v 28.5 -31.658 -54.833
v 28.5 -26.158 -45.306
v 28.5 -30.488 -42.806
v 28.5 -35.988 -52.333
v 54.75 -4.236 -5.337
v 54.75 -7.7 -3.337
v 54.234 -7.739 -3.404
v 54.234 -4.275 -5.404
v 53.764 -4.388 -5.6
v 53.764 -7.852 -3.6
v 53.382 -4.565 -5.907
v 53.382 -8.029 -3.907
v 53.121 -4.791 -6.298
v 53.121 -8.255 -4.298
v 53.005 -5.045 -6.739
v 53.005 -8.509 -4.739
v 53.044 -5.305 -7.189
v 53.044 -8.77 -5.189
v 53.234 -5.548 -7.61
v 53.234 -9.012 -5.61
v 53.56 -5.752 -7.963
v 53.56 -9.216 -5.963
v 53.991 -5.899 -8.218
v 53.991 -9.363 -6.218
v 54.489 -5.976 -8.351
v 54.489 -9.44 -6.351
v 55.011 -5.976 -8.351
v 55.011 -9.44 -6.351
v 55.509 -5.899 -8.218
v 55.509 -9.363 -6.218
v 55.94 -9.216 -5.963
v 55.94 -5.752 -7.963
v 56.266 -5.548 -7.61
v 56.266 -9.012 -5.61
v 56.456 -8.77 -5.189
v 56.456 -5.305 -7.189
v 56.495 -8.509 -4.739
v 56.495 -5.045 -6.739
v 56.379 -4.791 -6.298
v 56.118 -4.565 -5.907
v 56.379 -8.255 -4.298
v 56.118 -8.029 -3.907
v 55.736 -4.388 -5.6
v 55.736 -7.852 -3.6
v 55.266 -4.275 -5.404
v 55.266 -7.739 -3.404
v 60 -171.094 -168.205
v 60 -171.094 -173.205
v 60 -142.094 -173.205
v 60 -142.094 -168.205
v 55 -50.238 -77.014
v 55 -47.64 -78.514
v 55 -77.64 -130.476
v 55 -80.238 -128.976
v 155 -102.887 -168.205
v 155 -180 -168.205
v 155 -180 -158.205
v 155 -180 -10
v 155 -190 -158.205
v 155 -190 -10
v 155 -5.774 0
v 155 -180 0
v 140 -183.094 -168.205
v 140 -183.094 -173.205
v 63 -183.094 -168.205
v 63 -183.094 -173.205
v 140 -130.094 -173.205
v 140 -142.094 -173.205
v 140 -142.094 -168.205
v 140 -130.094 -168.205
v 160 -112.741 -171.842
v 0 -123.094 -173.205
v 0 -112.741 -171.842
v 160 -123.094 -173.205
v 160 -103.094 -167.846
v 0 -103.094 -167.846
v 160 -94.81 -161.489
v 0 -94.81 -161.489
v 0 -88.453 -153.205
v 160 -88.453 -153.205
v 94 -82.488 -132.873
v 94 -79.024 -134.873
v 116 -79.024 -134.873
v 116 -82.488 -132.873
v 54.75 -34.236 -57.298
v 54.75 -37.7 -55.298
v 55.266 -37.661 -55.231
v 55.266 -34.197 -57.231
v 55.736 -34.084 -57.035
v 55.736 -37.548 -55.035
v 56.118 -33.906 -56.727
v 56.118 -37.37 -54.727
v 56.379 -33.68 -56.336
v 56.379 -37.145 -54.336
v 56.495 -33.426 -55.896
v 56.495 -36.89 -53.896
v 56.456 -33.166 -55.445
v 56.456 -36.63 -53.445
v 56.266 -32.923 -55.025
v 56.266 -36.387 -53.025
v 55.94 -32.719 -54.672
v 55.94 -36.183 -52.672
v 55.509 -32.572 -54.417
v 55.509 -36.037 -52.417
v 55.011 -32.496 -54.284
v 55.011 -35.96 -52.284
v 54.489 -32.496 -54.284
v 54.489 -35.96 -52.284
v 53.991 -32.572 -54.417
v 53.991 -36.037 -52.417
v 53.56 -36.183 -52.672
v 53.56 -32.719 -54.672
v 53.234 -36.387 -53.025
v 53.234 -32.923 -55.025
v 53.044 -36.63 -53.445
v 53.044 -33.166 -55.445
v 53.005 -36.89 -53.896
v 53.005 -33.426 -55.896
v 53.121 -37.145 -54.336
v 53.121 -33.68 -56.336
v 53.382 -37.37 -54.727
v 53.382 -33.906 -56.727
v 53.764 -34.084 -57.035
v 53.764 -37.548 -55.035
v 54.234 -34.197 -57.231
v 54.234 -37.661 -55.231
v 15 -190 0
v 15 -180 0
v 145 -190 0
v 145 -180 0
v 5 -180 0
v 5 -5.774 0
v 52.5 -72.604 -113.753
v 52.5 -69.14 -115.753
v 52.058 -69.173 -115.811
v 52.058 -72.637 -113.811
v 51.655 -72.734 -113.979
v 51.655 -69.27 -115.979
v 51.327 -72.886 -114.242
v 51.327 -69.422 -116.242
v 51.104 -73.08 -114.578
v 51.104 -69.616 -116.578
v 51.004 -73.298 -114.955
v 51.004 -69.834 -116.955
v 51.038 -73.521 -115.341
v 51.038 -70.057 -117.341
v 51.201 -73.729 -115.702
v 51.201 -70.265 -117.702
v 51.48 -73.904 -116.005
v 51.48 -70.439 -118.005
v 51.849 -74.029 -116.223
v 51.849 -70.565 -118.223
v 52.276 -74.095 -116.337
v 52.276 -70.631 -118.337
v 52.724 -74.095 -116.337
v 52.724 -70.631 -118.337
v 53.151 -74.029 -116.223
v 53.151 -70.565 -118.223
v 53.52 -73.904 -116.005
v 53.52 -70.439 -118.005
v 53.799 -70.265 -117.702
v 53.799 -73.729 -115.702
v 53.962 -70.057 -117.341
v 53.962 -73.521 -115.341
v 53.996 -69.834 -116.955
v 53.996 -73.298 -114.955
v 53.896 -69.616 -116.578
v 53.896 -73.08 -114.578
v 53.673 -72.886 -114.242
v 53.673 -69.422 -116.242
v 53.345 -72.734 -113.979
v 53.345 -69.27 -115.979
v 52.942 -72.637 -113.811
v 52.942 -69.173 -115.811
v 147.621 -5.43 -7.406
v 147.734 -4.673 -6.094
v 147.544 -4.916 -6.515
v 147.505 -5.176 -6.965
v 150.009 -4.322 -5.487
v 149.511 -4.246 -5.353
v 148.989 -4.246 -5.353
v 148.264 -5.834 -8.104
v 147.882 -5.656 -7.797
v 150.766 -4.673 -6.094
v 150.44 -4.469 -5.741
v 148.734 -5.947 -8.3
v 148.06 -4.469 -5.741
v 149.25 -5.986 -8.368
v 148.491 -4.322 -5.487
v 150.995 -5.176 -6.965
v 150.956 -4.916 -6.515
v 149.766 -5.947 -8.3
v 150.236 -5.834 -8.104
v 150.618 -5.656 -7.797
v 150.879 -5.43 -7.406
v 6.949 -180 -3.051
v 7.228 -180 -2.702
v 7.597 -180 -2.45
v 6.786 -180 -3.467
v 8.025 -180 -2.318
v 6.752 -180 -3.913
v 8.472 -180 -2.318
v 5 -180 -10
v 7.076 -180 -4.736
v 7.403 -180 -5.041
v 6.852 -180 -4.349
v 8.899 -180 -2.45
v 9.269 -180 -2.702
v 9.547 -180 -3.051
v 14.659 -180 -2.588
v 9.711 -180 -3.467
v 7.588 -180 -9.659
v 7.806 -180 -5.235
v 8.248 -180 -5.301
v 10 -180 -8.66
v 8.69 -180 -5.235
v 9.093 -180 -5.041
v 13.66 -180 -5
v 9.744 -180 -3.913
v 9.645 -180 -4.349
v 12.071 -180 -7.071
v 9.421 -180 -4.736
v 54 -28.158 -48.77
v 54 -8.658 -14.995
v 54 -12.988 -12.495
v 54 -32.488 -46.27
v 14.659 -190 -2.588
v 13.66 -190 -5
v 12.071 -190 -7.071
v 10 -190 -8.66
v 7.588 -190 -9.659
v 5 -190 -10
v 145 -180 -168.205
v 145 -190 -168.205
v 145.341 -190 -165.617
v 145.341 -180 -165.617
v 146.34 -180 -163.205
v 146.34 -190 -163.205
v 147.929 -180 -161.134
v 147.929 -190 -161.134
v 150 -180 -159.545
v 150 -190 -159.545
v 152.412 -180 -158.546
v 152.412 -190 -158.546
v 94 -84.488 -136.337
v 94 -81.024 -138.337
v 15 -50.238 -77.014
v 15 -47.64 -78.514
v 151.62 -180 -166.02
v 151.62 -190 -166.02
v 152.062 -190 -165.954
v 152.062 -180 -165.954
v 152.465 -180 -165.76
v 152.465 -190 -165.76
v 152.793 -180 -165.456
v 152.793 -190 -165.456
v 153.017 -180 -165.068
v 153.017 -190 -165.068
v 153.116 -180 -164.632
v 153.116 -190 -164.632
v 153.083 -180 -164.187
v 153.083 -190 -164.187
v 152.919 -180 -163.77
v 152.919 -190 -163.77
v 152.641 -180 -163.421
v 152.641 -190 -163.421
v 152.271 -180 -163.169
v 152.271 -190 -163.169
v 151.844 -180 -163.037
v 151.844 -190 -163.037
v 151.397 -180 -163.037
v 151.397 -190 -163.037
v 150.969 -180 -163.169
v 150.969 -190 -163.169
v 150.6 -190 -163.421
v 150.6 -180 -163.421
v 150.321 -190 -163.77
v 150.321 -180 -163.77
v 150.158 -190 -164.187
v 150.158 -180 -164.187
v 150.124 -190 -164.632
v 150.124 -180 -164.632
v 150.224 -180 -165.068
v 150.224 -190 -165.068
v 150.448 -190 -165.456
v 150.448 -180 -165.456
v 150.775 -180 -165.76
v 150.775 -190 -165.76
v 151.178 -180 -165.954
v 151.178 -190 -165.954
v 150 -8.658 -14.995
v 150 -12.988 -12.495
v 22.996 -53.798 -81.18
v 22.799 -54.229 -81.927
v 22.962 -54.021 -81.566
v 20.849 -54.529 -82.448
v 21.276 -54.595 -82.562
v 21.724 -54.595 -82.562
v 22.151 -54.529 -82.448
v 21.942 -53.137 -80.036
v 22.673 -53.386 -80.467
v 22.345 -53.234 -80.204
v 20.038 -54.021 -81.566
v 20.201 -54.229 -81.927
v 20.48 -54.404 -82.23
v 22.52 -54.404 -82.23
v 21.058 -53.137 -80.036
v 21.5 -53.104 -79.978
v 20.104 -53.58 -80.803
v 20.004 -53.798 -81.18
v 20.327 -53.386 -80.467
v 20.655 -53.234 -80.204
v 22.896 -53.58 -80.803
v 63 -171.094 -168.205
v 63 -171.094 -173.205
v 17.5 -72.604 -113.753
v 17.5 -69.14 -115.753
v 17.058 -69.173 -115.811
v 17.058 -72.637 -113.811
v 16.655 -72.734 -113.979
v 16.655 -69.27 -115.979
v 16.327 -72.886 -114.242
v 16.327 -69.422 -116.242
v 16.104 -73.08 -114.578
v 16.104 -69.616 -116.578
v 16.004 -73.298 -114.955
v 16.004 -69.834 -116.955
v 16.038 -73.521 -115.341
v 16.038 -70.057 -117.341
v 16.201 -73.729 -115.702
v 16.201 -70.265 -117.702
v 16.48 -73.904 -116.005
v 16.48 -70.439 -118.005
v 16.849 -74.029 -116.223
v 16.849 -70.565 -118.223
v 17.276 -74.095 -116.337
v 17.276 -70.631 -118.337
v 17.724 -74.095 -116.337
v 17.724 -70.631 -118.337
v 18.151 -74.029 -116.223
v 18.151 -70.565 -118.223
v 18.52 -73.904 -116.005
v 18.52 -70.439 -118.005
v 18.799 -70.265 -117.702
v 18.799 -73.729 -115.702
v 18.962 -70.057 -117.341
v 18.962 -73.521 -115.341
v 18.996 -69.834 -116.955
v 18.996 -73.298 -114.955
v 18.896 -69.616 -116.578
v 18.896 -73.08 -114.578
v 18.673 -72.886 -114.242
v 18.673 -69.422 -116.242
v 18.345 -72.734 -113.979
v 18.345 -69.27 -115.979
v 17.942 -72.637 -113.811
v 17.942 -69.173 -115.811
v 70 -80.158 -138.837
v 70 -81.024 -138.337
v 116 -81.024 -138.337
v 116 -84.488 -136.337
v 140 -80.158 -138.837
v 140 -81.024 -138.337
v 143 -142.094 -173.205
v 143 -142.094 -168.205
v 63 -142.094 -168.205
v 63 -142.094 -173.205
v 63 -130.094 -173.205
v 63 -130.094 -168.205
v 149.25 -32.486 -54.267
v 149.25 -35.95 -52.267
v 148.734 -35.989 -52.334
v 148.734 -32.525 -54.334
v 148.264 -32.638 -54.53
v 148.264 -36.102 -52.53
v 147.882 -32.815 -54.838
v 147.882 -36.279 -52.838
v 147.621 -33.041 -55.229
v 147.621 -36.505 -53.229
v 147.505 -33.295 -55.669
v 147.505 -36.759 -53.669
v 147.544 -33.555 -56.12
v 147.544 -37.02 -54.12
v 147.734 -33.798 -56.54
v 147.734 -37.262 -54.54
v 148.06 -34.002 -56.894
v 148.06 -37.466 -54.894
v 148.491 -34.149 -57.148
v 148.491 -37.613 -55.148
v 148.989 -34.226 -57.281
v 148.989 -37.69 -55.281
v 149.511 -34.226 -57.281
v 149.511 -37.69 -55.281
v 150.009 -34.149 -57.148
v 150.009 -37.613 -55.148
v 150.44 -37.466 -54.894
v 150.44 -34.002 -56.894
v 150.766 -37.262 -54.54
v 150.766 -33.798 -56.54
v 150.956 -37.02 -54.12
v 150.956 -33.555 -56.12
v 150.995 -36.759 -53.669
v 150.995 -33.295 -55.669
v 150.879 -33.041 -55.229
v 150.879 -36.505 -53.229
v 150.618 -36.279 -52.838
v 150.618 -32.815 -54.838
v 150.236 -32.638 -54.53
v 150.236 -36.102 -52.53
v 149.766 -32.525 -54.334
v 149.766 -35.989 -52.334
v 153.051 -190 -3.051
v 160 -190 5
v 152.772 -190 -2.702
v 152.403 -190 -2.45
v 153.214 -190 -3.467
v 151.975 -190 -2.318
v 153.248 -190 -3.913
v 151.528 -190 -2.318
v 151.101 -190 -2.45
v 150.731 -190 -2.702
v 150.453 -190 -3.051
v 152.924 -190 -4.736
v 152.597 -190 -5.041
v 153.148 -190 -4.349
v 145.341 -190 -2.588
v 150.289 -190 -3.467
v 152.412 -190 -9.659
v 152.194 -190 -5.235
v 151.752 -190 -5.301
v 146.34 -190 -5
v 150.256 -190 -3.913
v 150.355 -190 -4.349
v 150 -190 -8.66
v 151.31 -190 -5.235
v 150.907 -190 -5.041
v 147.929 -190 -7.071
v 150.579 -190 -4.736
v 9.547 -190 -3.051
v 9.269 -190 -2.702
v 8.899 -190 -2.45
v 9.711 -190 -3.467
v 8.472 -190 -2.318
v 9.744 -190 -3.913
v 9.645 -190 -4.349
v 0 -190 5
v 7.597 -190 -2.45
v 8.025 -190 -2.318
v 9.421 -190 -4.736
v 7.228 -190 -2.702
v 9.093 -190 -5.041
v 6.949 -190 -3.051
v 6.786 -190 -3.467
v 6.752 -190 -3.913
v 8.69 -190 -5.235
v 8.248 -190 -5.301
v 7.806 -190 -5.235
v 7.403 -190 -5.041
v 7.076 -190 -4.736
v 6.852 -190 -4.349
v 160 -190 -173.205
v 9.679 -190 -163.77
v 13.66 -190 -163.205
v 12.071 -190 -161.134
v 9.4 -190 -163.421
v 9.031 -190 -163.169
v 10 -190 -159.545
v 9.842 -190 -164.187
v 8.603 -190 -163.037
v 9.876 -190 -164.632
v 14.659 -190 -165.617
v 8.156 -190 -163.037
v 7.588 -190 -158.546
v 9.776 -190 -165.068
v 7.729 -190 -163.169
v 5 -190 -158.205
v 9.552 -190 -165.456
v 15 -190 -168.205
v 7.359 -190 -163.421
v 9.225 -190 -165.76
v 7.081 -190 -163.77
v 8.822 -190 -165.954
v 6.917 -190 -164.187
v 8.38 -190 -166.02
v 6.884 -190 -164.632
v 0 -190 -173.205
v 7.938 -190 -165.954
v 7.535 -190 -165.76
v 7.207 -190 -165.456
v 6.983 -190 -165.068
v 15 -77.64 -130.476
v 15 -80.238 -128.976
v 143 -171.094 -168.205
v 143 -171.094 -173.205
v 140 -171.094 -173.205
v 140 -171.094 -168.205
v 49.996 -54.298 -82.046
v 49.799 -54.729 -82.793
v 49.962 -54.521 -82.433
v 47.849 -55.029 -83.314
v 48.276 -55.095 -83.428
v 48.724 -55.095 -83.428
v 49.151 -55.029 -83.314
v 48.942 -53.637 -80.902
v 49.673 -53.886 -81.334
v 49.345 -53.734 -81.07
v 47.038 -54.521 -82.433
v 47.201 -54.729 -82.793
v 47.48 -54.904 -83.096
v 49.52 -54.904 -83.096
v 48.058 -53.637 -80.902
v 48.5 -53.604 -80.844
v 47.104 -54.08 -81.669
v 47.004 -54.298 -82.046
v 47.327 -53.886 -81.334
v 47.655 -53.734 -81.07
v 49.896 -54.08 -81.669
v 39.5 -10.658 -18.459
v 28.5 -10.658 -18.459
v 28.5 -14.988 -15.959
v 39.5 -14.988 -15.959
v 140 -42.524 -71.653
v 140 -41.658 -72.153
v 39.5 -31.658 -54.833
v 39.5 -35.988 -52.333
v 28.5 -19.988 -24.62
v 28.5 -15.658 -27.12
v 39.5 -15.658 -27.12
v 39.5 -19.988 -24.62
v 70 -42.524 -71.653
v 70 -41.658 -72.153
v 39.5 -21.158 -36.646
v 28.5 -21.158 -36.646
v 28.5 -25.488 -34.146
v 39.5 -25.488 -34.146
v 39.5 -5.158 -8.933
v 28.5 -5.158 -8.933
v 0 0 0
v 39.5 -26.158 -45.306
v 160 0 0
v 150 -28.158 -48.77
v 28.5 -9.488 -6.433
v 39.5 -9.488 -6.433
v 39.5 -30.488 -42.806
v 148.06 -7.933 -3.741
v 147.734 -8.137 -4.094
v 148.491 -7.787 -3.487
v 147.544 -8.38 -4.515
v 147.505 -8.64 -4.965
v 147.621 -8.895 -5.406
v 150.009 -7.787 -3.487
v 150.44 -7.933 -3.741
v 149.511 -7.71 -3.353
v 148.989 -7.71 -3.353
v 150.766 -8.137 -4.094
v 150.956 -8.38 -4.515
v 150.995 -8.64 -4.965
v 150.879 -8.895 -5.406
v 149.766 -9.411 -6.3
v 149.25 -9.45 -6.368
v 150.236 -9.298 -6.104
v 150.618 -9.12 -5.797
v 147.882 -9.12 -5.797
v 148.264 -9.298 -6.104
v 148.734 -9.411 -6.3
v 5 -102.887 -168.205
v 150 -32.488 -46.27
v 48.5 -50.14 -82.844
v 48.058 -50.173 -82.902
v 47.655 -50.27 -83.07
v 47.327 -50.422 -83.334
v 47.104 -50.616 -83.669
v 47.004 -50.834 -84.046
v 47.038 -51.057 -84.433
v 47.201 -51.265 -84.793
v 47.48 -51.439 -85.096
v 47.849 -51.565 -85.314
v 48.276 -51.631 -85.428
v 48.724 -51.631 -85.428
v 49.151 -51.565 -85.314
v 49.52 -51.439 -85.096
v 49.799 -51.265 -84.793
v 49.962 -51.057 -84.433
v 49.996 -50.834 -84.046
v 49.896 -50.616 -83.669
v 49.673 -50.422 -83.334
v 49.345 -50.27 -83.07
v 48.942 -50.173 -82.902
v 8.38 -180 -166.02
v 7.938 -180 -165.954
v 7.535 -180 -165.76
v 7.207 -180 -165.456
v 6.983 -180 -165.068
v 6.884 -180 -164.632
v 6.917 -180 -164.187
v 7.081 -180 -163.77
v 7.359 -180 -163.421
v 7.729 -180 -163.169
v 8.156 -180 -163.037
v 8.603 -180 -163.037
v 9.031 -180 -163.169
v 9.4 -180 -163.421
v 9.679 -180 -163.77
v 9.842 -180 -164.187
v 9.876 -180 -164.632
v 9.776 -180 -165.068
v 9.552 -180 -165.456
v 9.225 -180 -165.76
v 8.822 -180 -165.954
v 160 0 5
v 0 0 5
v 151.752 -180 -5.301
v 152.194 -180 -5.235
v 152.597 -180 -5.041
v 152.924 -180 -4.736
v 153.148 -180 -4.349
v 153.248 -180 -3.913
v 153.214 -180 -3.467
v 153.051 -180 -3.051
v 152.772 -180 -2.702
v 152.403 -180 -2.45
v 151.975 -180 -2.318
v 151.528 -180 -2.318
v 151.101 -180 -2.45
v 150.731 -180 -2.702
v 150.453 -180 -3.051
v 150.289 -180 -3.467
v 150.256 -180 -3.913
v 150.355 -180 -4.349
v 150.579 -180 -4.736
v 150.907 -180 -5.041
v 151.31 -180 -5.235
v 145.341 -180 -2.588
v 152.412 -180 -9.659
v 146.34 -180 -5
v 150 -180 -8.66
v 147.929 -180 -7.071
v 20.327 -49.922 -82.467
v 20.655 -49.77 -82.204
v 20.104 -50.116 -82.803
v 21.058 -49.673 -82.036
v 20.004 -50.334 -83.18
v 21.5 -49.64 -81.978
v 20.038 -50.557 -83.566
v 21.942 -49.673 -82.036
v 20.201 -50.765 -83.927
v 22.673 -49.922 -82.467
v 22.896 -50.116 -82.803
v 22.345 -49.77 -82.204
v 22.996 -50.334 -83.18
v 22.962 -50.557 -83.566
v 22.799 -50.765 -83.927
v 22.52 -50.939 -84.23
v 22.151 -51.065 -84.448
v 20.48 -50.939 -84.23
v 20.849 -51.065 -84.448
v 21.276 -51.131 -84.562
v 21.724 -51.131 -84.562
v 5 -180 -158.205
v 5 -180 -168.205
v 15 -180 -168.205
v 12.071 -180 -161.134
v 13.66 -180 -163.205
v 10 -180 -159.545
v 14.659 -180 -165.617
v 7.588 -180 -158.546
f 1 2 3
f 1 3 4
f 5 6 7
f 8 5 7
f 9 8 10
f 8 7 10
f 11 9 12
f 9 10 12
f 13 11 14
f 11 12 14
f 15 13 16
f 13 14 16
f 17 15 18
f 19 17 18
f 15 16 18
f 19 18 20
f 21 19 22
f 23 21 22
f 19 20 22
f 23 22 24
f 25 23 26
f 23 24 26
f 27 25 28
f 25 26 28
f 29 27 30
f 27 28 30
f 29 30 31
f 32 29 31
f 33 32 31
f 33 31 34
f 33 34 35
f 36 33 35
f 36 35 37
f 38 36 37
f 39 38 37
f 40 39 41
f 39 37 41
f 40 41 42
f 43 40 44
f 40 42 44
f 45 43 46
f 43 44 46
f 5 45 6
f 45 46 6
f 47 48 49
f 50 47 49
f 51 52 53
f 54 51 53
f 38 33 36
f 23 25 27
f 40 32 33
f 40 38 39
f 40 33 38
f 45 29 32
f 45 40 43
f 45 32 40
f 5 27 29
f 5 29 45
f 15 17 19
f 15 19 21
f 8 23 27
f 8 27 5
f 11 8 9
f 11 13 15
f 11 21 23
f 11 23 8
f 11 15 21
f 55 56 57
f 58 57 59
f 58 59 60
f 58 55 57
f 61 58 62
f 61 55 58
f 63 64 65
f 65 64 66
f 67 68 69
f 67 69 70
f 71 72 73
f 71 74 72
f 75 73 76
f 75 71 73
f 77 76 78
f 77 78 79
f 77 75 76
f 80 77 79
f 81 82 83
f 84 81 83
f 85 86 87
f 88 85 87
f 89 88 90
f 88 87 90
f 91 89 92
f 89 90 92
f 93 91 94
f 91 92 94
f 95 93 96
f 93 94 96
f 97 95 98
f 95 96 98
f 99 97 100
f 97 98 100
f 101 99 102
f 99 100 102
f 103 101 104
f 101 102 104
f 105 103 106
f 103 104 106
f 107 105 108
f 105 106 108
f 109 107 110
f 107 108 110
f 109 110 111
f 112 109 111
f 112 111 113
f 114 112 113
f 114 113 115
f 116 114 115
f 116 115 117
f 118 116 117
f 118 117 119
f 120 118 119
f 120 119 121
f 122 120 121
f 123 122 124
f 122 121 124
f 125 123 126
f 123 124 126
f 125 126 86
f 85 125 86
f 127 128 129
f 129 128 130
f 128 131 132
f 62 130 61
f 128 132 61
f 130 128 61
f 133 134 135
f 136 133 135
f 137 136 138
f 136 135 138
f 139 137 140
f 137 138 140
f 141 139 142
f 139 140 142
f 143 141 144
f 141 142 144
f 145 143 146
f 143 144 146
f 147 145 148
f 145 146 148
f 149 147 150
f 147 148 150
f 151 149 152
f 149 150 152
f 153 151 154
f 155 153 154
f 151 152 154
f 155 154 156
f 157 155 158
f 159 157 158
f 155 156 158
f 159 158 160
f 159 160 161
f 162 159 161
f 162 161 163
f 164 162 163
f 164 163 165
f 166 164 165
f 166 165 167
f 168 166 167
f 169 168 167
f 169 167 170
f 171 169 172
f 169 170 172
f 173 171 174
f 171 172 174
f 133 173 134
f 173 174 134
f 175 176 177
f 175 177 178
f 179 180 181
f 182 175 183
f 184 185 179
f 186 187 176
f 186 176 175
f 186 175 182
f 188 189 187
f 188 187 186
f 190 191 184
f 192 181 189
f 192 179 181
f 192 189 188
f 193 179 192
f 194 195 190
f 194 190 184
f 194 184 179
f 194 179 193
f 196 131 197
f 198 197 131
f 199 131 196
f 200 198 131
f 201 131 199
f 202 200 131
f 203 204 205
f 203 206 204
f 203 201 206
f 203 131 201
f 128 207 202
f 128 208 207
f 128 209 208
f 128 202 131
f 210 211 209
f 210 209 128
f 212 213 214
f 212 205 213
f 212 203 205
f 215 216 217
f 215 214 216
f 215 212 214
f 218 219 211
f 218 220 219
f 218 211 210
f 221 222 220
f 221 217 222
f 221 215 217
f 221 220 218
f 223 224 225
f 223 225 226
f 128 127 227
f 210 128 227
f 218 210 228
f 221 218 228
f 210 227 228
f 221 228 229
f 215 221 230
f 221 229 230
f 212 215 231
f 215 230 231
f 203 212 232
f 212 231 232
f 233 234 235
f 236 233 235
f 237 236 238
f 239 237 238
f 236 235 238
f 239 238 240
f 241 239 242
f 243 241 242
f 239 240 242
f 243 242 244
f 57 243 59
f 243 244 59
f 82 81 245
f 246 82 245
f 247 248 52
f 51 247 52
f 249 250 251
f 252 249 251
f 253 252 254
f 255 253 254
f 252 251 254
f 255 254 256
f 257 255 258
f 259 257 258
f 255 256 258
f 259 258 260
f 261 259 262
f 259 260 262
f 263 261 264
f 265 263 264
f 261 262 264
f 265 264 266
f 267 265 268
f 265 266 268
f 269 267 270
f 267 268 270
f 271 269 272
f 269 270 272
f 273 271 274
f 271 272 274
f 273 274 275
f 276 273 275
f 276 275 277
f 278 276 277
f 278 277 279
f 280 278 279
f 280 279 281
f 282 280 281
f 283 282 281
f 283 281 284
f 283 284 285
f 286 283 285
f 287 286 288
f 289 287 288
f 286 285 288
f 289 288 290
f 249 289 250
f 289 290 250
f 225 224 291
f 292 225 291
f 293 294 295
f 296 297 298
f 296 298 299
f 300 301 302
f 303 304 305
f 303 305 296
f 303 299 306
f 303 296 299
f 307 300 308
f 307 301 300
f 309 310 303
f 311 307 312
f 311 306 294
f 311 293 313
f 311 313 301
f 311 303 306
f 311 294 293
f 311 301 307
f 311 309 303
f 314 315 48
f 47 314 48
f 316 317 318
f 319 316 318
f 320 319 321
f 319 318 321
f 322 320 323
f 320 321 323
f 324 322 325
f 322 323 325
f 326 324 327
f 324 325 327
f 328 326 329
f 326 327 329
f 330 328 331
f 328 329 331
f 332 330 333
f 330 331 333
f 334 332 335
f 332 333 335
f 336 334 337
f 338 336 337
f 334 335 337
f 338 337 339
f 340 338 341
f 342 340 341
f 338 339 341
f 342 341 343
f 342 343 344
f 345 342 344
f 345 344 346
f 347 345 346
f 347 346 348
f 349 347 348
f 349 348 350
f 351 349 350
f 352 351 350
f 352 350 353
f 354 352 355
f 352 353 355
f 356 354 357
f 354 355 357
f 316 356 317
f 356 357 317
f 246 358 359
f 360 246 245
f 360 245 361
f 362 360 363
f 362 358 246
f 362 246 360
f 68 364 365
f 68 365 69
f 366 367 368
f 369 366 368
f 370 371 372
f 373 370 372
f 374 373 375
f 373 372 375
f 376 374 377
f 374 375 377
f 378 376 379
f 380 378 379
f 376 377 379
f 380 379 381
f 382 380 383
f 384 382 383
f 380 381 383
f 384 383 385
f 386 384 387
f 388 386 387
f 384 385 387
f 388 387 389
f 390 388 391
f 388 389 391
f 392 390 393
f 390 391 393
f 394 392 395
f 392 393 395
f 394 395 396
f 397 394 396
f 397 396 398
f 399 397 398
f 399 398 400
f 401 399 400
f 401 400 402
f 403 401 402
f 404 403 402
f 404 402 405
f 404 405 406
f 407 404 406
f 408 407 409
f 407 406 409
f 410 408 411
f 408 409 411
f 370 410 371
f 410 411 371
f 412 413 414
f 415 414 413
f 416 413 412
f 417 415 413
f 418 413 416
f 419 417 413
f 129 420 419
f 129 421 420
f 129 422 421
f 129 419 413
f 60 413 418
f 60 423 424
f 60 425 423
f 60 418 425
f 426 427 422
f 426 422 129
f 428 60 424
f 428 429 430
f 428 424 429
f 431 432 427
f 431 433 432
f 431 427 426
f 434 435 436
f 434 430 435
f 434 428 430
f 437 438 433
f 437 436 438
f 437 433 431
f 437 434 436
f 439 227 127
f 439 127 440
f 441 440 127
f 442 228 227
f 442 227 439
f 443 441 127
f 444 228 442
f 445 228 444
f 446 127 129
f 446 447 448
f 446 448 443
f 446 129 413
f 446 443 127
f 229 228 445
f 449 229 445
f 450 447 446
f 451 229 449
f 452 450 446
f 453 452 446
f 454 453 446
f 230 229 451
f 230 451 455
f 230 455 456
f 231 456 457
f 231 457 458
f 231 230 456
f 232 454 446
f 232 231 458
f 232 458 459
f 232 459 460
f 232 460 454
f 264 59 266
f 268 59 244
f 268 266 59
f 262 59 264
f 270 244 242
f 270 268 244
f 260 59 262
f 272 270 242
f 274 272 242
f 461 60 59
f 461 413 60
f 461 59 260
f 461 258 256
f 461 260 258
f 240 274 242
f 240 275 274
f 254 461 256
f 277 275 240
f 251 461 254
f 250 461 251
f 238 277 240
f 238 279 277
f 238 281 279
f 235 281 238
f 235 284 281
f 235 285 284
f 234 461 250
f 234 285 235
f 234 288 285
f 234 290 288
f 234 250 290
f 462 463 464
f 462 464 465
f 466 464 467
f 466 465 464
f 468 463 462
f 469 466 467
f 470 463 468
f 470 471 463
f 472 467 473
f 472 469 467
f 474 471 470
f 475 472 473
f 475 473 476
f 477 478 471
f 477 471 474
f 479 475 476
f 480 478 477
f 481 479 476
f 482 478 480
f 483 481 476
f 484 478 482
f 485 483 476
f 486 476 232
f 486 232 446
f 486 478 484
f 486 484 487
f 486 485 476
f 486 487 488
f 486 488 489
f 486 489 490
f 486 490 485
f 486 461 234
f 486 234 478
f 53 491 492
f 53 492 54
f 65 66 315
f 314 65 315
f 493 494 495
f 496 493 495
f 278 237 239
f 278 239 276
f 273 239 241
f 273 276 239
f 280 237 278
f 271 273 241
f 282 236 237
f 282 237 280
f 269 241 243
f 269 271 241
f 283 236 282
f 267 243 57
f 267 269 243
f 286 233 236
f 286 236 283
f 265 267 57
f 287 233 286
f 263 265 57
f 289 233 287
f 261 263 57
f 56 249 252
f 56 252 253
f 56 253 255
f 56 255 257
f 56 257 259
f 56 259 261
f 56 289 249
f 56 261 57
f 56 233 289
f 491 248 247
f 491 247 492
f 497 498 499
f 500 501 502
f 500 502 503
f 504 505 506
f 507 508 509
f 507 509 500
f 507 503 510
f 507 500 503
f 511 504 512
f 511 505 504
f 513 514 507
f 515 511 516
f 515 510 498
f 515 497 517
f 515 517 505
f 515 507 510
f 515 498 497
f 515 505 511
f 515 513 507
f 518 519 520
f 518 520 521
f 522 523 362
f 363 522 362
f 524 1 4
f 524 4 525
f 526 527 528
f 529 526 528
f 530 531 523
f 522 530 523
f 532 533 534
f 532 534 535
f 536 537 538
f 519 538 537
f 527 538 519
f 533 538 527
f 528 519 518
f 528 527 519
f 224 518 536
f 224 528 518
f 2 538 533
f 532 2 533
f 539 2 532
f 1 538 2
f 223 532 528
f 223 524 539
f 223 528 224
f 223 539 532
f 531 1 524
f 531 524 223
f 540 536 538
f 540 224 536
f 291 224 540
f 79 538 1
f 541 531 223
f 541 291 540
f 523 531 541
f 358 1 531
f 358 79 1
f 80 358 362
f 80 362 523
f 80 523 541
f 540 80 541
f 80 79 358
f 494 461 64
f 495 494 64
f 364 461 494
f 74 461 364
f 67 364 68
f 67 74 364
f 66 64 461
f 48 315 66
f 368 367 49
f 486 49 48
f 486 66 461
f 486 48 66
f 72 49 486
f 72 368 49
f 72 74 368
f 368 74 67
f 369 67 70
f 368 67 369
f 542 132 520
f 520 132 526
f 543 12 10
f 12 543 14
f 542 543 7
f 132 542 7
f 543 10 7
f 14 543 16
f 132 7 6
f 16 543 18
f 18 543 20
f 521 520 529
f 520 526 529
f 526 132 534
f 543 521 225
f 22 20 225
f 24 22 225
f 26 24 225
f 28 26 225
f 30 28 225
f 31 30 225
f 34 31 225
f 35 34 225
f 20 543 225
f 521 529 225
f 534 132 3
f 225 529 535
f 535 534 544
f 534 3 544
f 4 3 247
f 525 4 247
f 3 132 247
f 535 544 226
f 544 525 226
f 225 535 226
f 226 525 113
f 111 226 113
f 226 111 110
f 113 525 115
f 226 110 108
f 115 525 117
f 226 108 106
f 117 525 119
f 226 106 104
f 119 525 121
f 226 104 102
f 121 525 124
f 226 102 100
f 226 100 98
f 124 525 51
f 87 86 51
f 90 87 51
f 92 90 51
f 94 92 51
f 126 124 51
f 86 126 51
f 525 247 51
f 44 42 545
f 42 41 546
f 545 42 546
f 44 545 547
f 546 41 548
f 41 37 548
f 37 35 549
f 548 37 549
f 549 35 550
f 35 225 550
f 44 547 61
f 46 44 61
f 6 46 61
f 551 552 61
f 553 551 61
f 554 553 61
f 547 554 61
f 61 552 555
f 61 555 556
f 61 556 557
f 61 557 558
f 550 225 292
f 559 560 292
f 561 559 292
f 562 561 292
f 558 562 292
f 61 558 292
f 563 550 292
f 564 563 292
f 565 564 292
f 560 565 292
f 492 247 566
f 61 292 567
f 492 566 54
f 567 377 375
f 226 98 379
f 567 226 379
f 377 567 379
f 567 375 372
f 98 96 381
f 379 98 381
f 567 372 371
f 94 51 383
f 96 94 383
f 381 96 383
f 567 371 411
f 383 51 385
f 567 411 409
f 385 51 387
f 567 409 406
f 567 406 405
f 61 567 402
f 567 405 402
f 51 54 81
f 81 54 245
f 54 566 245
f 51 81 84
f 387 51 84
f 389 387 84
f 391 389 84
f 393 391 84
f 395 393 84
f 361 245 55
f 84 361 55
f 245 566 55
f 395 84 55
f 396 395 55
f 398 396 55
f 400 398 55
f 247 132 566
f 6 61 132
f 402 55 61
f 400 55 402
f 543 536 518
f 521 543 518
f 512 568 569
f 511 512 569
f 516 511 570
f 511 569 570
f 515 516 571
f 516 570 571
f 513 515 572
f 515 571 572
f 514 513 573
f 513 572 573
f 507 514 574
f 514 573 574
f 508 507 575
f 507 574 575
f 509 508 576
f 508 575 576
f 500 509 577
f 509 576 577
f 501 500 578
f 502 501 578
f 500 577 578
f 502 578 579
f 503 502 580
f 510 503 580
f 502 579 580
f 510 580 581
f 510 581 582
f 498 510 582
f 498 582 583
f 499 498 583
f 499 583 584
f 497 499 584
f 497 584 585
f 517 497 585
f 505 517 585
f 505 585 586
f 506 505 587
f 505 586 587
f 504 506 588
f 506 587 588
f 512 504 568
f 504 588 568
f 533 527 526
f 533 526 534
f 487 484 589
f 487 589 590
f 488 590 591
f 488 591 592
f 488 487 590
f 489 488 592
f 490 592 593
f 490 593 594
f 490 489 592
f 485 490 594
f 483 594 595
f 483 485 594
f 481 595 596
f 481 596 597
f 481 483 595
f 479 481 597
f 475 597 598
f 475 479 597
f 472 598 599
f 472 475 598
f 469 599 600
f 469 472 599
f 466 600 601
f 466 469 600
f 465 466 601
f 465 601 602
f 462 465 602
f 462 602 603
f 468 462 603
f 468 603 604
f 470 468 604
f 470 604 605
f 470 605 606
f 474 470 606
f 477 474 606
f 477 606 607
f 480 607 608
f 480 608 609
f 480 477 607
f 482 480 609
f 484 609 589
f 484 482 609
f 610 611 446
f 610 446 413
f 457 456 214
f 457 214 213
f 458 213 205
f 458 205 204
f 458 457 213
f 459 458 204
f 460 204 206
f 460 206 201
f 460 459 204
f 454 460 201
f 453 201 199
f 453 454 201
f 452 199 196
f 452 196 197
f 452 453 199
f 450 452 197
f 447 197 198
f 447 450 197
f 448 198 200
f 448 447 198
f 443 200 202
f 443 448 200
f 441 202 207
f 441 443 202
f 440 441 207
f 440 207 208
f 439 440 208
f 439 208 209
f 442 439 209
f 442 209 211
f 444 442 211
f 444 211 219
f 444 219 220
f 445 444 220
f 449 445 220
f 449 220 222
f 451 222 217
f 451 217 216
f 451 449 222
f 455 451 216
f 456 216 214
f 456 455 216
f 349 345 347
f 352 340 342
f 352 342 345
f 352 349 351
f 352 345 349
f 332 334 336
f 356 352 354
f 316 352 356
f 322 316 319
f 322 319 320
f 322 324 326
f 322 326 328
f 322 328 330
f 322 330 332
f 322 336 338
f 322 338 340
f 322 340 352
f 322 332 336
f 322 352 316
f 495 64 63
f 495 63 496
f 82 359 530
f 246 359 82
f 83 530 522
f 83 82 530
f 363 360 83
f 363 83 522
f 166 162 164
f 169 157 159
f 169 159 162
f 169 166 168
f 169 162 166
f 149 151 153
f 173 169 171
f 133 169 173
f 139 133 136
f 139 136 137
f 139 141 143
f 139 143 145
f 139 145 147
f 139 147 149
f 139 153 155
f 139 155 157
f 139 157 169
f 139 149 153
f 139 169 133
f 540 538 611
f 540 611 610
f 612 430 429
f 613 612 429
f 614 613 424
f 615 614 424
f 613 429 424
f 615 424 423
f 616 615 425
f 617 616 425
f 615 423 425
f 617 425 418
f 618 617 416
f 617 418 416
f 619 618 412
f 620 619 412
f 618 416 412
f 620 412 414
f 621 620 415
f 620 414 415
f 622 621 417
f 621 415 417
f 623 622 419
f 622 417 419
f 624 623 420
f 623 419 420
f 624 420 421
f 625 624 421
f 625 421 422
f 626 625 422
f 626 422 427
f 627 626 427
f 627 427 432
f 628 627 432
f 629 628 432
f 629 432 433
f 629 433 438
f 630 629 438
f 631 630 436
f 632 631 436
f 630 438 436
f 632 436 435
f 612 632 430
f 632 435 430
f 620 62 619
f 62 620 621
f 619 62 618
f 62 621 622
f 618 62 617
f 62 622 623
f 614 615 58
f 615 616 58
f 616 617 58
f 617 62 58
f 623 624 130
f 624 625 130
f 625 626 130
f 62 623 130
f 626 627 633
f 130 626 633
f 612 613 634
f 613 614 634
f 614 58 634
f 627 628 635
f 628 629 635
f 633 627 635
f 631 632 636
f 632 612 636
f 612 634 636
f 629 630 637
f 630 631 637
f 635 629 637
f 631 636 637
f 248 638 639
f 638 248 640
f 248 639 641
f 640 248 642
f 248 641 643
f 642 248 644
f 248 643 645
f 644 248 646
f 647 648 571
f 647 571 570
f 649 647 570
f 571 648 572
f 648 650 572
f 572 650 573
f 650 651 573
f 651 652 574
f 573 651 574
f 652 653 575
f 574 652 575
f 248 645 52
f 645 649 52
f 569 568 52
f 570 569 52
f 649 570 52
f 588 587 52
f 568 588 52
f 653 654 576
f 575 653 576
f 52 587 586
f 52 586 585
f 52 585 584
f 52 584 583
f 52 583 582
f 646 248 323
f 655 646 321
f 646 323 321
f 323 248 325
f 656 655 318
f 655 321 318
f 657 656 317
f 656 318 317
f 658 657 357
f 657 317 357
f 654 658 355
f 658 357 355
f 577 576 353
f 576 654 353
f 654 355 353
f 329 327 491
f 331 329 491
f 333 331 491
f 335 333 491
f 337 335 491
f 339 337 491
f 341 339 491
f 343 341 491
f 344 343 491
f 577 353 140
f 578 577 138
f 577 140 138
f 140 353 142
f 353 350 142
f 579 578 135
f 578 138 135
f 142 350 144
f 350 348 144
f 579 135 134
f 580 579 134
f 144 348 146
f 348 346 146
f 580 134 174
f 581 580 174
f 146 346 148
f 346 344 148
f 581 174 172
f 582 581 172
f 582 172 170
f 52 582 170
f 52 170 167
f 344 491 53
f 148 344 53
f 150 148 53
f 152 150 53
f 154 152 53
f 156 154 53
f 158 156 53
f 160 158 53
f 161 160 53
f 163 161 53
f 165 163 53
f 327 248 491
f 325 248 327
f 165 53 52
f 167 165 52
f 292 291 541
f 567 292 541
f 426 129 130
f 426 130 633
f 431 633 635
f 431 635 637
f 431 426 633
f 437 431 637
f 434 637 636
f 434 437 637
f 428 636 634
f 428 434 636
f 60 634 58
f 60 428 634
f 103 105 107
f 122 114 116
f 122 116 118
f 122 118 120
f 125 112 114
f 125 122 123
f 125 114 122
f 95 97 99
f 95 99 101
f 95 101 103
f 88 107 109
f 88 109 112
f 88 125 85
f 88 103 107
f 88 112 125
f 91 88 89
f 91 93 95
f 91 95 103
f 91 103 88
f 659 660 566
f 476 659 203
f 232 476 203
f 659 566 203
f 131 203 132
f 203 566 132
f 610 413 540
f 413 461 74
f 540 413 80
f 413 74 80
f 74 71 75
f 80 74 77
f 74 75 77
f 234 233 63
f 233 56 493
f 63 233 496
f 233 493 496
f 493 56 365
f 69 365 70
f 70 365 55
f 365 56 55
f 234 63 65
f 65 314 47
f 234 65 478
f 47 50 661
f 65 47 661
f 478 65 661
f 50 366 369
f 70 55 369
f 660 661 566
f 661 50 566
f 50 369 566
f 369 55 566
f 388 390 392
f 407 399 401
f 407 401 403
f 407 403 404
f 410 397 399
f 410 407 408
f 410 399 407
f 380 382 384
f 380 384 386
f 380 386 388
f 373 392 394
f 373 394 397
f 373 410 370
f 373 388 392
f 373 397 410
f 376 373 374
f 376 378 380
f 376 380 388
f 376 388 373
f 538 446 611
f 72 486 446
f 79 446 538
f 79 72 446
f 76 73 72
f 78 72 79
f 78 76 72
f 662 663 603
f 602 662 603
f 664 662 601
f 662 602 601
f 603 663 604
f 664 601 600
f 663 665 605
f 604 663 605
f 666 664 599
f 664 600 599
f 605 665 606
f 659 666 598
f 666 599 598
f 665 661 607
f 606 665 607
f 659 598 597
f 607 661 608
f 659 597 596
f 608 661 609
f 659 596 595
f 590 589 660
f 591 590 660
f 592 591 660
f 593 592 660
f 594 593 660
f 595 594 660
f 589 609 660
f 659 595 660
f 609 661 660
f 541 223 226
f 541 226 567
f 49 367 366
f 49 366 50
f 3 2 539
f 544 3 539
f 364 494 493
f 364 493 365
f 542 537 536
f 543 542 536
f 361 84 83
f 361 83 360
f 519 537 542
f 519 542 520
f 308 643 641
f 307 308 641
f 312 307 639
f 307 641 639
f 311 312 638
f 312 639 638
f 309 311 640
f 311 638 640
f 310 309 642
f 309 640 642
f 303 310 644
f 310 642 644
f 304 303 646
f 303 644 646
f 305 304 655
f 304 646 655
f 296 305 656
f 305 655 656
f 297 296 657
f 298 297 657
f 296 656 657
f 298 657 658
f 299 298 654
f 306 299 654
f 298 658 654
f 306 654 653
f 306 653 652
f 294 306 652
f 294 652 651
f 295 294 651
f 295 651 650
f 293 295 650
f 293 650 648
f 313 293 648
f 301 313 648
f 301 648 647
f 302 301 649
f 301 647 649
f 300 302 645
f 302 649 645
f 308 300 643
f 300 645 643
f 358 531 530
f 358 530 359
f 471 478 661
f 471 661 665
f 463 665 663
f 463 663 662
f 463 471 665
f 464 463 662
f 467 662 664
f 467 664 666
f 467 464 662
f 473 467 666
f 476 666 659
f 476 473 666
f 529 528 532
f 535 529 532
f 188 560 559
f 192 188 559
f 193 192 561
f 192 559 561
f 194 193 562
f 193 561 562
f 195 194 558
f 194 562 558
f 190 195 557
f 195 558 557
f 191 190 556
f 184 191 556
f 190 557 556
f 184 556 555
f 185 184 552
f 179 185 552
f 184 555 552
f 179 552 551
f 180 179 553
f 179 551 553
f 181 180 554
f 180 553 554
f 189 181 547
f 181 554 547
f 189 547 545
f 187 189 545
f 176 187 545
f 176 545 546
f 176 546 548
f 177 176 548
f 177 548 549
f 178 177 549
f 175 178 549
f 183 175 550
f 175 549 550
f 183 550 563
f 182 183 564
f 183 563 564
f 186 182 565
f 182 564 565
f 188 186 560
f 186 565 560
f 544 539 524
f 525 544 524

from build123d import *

# Parameters (mm, degrees)
BOSS_EXTRUDE1_DEPTH  = 5
SKETCH2_W            = 160
SKETCH2_H            = 200
BOSS_EXTRUDE2_DEPTH  = 5
SKETCH4_W            = 160
SKETCH4_H            = 190
BOSS_EXTRUDE4_DEPTH  = 5
SKETCH5_W            = 160
SKETCH5_H            = 90
BOSS_EXTRUDE5_DEPTH  = 5
SKETCH6_W            = 96
SKETCH6_H            = 39
SKETCH6_W_2          = 11
SKETCH6_H_2          = 11
CUT_EXTRUDE2_DEPTH   = 5
FILLET1_R            = 40
SKETCH7_W            = 70
SKETCH7_H            = 77
CUT_EXTRUDE3_DEPTH   = 1
SKETCH8_W            = 22
SKETCH8_H            = 4
CUT_EXTRUDE4_DEPTH   = 4
SKETCH9_W            = 40
SKETCH9_H            = 60
CUT_EXTRUDE5_DEPTH   = 5
SKETCH12_W           = 40
SKETCH12_H           = 60
BOSS_EXTRUDE6_DEPTH  = 2
SKETCH14_W           = 77
SKETCH14_H           = 53
CUT_EXTRUDE6_DEPTH   = 5
SKETCH15_W           = 3
SKETCH15_H           = 29
CUT_EXTRUDE7_DEPTH   = 5
SKETCH17_R           = 1.75
CUT_EXTRUDE9_DEPTH   = 4
SKETCH21_R           = 1.5
BOSS_EXTRUDE8_DEPTH  = 4
SKETCH23_R           = 1.5
BOSS_EXTRUDE9_DEPTH  = 10
SKETCH25_R           = 1.5
BOSS_EXTRUDE10_DEPTH = 10


with BuildPart() as part:
    # Sketch1 → Boss-Extrude1 (new body)
    with BuildSketch(Plane(origin=(0, 0, 0), x_dir=(0, 0, -1), z_dir=(1, 0, 0))):
        Polygon((0, 0), (173.205080757, -100), (173.205080757, -190), (0, -190), align=None)
    boss_extrude1 = extrude(amount=BOSS_EXTRUDE1_DEPTH)

    # Sketch2 → Boss-Extrude2 (add)
    with BuildSketch(Plane(origin=(0, 0, 0), x_dir=(1, 0, 0), z_dir=(0, 0.8660254037844382, -0.5000000000000011))):
        with Locations((80, 100)):
            Rectangle(SKETCH2_W, SKETCH2_H)
    extrude(amount=-BOSS_EXTRUDE2_DEPTH)

    # Sketch4 → Boss-Extrude4 (add)
    with BuildSketch(Plane.XY):
        with Locations((80, -95)):
            Rectangle(SKETCH4_W, SKETCH4_H)
    extrude(amount=BOSS_EXTRUDE4_DEPTH)

    # Sketch5 → Boss-Extrude5 (add)
    with BuildSketch(Plane(origin=(0, 0, -173.205080757), x_dir=(-1, 0, 0), z_dir=(0, 0, -1))):
        with Locations((-80, -145)):
            Rectangle(SKETCH5_W, SKETCH5_H)
    extrude(amount=-BOSS_EXTRUDE5_DEPTH)

    # Mirror1: Boss-Extrude1 across plane
    add(boss_extrude1.mirror(Plane.ZY.offset(-80)))

    # Sketch6 → Cut-Extrude2 (cut)
    with BuildSketch(Plane(origin=(0, 0, 0), x_dir=(1, 0, 0), z_dir=(0, 0.8660254037844382, -0.5000000000000011))):
        with Locations((102, 36.815172727)):
            Rectangle(SKETCH6_W, SKETCH6_H)
        with Locations((34, 15.815172727)):
            Rectangle(SKETCH6_W_2, SKETCH6_H_2)
        with Locations((34, 36.815172727)):
            Rectangle(SKETCH6_W_2, SKETCH6_H_2)
        with Locations((34, 57.815172727)):
            Rectangle(SKETCH6_W_2, SKETCH6_H_2)
    extrude(amount=-CUT_EXTRUDE2_DEPTH, mode=Mode.SUBTRACT)

    # Fillet1
    fillet1_edges = [part.edges().sort_by_distance(p)[0] for p in [
        (80, -100, -173.205080757),
    ]]
    fillet(fillet1_edges, radius=FILLET1_R)

    # Sketch7 → Cut-Extrude3 (cut)
    with BuildSketch(Plane(origin=(0, 0, 0), x_dir=(1, 0, 0), z_dir=(0, 0.8660254037844382, -0.5000000000000011))):
        with Locations((105, 121.815172727)):
            Rectangle(SKETCH7_W, SKETCH7_H)
    extrude(amount=-CUT_EXTRUDE3_DEPTH, mode=Mode.SUBTRACT)

    # Sketch8 → Cut-Extrude4 (cut)
    with BuildSketch(Plane(origin=(0, -0.866025403784426, 0.4999999999999943), x_dir=(1, 0, 0), z_dir=(0, 0.8660254037844382, -0.5000000000000011))):
        with Locations((105, 158.315172727)):
            Rectangle(SKETCH8_W, SKETCH8_H)
    extrude(amount=-CUT_EXTRUDE4_DEPTH, mode=Mode.SUBTRACT)

    # Sketch9 → Cut-Extrude5 (cut)
    with BuildSketch(Plane(origin=(0, 0, 0), x_dir=(1, 0, 0), z_dir=(0, 0.8660254037844382, -0.5000000000000011))):
        with Locations((35, 121.815172727)):
            Rectangle(SKETCH9_W, SKETCH9_H)
    extrude(amount=-CUT_EXTRUDE5_DEPTH, mode=Mode.SUBTRACT)

    # Sketch12 → Boss-Extrude6 (add)
    with BuildSketch(Plane(origin=(0, 0, 0), x_dir=(1, 0, 0), z_dir=(0, 0.8660254037844382, -0.5000000000000011))):
        with Locations((35, 121.815172727)):
            Rectangle(SKETCH12_W, SKETCH12_H)
    extrude(amount=-BOSS_EXTRUDE6_DEPTH)

    # Sketch14 → Cut-Extrude6 (cut)
    with BuildSketch(Plane(origin=(0, 0, -173.205080757), x_dir=(-1, 0, 0), z_dir=(0, 0, -1))):
        with Locations((-101.5, -156.594010768)):
            Rectangle(SKETCH14_W, SKETCH14_H)
    extrude(amount=-CUT_EXTRUDE6_DEPTH, mode=Mode.SUBTRACT)

    # Sketch15 → Cut-Extrude7 (cut)
    with BuildSketch(Plane(origin=(0, 0, -173.205080757), x_dir=(-1, 0, 0), z_dir=(0, 0, -1))):
        with Locations((-61.5, -156.594010768)):
            Rectangle(SKETCH15_W, SKETCH15_H)
        with Locations((-141.5, -156.594010768)):
            Rectangle(SKETCH15_W, SKETCH15_H)
    extrude(amount=-CUT_EXTRUDE7_DEPTH, mode=Mode.SUBTRACT)

    # Sketch17 → Cut-Extrude9 (cut)
    with BuildSketch(Plane(origin=(0, -4.330127019, 2.5), x_dir=(-1, 0, 0), z_dir=(0, -0.8660254037844382, 0.500000000000001))):
        with Locations(Location((-54.75, 64.989476433, 0), (0, 0, 90))):
            Circle(SKETCH17_R)
        with Locations(Location((-149.25, 64.989476433, 0), (0, 0, 270))):
            Circle(SKETCH17_R)
        with Locations(Location((-54.75, 8.489476433, 0), (0, 0, 270))):
            Circle(SKETCH17_R)
        with Locations(Location((-149.25, 8.489476433, 0), (0, 0, 90))):
            Circle(SKETCH17_R)
    extrude(amount=-CUT_EXTRUDE9_DEPTH, mode=Mode.SUBTRACT)

    # Sketch21 → Boss-Extrude8 (add)
    with BuildSketch(Plane(origin=(0, -1.732050808, 1), x_dir=(-1, 0, 0), z_dir=(0, -0.8660254037844382, 0.500000000000001))):
        with Locations(Location((-48.5, 98.315172727, 0), (0, 0, 270))):
            Circle(SKETCH21_R)
        with Locations(Location((-21.5, 97.315172727, 0), (0, 0, 270))):
            Circle(SKETCH21_R)
        with Locations(Location((-17.5, 136.315172727, 0), (0, 0, 270))):
            Circle(SKETCH21_R)
        with Locations(Location((-52.5, 136.315172727, 0), (0, 0, 270))):
            Circle(SKETCH21_R)
    extrude(amount=BOSS_EXTRUDE8_DEPTH)

    # Sketch23 → Boss-Extrude9 (add)
    with BuildSketch(Plane(origin=(0, -190, 0), x_dir=(-1, 0, 0), z_dir=(0, -1, 0))):
        with BuildLine():
            Line((-155, 0), (-145, 0))
            ThreePointArc((-145, 0), (-147.928932188, 7.071067812), (-155, 10))
            Line((-155, 10), (-155, 0))
        make_face()
        with Locations(Location((-151.751738587, 3.801157428, 0), (0, 0, 90))):
            Circle(SKETCH23_R, mode=Mode.SUBTRACT)
    boss_extrude9 = extrude(amount=-BOSS_EXTRUDE9_DEPTH)

    # Mirror2: Boss-Extrude9 across plane
    add(boss_extrude9.mirror(Plane.ZY.offset(-80)))

    # Sketch25 → Boss-Extrude10 (add)
    with BuildSketch(Plane(origin=(0, -190, 0), x_dir=(-1, 0, 0), z_dir=(0, -1, 0))):
        with BuildLine():
            Line((-155, 168.205080757), (-145, 168.205080757))
            ThreePointArc((-145, 168.205080757), (-147.928932188, 161.134012945), (-155, 158.205080757))
            Line((-155, 158.205080757), (-155, 168.205080757))
        make_face()
        with Locations(Location((-151.620258089, 164.520335906, 0), (0, 0, 90))):
            Circle(SKETCH25_R, mode=Mode.SUBTRACT)
    boss_extrude10 = extrude(amount=-BOSS_EXTRUDE10_DEPTH)

    # Mirror4: Boss-Extrude10 across plane
    add(boss_extrude10.mirror(Plane.ZY.offset(-80)))


solid = part.part
